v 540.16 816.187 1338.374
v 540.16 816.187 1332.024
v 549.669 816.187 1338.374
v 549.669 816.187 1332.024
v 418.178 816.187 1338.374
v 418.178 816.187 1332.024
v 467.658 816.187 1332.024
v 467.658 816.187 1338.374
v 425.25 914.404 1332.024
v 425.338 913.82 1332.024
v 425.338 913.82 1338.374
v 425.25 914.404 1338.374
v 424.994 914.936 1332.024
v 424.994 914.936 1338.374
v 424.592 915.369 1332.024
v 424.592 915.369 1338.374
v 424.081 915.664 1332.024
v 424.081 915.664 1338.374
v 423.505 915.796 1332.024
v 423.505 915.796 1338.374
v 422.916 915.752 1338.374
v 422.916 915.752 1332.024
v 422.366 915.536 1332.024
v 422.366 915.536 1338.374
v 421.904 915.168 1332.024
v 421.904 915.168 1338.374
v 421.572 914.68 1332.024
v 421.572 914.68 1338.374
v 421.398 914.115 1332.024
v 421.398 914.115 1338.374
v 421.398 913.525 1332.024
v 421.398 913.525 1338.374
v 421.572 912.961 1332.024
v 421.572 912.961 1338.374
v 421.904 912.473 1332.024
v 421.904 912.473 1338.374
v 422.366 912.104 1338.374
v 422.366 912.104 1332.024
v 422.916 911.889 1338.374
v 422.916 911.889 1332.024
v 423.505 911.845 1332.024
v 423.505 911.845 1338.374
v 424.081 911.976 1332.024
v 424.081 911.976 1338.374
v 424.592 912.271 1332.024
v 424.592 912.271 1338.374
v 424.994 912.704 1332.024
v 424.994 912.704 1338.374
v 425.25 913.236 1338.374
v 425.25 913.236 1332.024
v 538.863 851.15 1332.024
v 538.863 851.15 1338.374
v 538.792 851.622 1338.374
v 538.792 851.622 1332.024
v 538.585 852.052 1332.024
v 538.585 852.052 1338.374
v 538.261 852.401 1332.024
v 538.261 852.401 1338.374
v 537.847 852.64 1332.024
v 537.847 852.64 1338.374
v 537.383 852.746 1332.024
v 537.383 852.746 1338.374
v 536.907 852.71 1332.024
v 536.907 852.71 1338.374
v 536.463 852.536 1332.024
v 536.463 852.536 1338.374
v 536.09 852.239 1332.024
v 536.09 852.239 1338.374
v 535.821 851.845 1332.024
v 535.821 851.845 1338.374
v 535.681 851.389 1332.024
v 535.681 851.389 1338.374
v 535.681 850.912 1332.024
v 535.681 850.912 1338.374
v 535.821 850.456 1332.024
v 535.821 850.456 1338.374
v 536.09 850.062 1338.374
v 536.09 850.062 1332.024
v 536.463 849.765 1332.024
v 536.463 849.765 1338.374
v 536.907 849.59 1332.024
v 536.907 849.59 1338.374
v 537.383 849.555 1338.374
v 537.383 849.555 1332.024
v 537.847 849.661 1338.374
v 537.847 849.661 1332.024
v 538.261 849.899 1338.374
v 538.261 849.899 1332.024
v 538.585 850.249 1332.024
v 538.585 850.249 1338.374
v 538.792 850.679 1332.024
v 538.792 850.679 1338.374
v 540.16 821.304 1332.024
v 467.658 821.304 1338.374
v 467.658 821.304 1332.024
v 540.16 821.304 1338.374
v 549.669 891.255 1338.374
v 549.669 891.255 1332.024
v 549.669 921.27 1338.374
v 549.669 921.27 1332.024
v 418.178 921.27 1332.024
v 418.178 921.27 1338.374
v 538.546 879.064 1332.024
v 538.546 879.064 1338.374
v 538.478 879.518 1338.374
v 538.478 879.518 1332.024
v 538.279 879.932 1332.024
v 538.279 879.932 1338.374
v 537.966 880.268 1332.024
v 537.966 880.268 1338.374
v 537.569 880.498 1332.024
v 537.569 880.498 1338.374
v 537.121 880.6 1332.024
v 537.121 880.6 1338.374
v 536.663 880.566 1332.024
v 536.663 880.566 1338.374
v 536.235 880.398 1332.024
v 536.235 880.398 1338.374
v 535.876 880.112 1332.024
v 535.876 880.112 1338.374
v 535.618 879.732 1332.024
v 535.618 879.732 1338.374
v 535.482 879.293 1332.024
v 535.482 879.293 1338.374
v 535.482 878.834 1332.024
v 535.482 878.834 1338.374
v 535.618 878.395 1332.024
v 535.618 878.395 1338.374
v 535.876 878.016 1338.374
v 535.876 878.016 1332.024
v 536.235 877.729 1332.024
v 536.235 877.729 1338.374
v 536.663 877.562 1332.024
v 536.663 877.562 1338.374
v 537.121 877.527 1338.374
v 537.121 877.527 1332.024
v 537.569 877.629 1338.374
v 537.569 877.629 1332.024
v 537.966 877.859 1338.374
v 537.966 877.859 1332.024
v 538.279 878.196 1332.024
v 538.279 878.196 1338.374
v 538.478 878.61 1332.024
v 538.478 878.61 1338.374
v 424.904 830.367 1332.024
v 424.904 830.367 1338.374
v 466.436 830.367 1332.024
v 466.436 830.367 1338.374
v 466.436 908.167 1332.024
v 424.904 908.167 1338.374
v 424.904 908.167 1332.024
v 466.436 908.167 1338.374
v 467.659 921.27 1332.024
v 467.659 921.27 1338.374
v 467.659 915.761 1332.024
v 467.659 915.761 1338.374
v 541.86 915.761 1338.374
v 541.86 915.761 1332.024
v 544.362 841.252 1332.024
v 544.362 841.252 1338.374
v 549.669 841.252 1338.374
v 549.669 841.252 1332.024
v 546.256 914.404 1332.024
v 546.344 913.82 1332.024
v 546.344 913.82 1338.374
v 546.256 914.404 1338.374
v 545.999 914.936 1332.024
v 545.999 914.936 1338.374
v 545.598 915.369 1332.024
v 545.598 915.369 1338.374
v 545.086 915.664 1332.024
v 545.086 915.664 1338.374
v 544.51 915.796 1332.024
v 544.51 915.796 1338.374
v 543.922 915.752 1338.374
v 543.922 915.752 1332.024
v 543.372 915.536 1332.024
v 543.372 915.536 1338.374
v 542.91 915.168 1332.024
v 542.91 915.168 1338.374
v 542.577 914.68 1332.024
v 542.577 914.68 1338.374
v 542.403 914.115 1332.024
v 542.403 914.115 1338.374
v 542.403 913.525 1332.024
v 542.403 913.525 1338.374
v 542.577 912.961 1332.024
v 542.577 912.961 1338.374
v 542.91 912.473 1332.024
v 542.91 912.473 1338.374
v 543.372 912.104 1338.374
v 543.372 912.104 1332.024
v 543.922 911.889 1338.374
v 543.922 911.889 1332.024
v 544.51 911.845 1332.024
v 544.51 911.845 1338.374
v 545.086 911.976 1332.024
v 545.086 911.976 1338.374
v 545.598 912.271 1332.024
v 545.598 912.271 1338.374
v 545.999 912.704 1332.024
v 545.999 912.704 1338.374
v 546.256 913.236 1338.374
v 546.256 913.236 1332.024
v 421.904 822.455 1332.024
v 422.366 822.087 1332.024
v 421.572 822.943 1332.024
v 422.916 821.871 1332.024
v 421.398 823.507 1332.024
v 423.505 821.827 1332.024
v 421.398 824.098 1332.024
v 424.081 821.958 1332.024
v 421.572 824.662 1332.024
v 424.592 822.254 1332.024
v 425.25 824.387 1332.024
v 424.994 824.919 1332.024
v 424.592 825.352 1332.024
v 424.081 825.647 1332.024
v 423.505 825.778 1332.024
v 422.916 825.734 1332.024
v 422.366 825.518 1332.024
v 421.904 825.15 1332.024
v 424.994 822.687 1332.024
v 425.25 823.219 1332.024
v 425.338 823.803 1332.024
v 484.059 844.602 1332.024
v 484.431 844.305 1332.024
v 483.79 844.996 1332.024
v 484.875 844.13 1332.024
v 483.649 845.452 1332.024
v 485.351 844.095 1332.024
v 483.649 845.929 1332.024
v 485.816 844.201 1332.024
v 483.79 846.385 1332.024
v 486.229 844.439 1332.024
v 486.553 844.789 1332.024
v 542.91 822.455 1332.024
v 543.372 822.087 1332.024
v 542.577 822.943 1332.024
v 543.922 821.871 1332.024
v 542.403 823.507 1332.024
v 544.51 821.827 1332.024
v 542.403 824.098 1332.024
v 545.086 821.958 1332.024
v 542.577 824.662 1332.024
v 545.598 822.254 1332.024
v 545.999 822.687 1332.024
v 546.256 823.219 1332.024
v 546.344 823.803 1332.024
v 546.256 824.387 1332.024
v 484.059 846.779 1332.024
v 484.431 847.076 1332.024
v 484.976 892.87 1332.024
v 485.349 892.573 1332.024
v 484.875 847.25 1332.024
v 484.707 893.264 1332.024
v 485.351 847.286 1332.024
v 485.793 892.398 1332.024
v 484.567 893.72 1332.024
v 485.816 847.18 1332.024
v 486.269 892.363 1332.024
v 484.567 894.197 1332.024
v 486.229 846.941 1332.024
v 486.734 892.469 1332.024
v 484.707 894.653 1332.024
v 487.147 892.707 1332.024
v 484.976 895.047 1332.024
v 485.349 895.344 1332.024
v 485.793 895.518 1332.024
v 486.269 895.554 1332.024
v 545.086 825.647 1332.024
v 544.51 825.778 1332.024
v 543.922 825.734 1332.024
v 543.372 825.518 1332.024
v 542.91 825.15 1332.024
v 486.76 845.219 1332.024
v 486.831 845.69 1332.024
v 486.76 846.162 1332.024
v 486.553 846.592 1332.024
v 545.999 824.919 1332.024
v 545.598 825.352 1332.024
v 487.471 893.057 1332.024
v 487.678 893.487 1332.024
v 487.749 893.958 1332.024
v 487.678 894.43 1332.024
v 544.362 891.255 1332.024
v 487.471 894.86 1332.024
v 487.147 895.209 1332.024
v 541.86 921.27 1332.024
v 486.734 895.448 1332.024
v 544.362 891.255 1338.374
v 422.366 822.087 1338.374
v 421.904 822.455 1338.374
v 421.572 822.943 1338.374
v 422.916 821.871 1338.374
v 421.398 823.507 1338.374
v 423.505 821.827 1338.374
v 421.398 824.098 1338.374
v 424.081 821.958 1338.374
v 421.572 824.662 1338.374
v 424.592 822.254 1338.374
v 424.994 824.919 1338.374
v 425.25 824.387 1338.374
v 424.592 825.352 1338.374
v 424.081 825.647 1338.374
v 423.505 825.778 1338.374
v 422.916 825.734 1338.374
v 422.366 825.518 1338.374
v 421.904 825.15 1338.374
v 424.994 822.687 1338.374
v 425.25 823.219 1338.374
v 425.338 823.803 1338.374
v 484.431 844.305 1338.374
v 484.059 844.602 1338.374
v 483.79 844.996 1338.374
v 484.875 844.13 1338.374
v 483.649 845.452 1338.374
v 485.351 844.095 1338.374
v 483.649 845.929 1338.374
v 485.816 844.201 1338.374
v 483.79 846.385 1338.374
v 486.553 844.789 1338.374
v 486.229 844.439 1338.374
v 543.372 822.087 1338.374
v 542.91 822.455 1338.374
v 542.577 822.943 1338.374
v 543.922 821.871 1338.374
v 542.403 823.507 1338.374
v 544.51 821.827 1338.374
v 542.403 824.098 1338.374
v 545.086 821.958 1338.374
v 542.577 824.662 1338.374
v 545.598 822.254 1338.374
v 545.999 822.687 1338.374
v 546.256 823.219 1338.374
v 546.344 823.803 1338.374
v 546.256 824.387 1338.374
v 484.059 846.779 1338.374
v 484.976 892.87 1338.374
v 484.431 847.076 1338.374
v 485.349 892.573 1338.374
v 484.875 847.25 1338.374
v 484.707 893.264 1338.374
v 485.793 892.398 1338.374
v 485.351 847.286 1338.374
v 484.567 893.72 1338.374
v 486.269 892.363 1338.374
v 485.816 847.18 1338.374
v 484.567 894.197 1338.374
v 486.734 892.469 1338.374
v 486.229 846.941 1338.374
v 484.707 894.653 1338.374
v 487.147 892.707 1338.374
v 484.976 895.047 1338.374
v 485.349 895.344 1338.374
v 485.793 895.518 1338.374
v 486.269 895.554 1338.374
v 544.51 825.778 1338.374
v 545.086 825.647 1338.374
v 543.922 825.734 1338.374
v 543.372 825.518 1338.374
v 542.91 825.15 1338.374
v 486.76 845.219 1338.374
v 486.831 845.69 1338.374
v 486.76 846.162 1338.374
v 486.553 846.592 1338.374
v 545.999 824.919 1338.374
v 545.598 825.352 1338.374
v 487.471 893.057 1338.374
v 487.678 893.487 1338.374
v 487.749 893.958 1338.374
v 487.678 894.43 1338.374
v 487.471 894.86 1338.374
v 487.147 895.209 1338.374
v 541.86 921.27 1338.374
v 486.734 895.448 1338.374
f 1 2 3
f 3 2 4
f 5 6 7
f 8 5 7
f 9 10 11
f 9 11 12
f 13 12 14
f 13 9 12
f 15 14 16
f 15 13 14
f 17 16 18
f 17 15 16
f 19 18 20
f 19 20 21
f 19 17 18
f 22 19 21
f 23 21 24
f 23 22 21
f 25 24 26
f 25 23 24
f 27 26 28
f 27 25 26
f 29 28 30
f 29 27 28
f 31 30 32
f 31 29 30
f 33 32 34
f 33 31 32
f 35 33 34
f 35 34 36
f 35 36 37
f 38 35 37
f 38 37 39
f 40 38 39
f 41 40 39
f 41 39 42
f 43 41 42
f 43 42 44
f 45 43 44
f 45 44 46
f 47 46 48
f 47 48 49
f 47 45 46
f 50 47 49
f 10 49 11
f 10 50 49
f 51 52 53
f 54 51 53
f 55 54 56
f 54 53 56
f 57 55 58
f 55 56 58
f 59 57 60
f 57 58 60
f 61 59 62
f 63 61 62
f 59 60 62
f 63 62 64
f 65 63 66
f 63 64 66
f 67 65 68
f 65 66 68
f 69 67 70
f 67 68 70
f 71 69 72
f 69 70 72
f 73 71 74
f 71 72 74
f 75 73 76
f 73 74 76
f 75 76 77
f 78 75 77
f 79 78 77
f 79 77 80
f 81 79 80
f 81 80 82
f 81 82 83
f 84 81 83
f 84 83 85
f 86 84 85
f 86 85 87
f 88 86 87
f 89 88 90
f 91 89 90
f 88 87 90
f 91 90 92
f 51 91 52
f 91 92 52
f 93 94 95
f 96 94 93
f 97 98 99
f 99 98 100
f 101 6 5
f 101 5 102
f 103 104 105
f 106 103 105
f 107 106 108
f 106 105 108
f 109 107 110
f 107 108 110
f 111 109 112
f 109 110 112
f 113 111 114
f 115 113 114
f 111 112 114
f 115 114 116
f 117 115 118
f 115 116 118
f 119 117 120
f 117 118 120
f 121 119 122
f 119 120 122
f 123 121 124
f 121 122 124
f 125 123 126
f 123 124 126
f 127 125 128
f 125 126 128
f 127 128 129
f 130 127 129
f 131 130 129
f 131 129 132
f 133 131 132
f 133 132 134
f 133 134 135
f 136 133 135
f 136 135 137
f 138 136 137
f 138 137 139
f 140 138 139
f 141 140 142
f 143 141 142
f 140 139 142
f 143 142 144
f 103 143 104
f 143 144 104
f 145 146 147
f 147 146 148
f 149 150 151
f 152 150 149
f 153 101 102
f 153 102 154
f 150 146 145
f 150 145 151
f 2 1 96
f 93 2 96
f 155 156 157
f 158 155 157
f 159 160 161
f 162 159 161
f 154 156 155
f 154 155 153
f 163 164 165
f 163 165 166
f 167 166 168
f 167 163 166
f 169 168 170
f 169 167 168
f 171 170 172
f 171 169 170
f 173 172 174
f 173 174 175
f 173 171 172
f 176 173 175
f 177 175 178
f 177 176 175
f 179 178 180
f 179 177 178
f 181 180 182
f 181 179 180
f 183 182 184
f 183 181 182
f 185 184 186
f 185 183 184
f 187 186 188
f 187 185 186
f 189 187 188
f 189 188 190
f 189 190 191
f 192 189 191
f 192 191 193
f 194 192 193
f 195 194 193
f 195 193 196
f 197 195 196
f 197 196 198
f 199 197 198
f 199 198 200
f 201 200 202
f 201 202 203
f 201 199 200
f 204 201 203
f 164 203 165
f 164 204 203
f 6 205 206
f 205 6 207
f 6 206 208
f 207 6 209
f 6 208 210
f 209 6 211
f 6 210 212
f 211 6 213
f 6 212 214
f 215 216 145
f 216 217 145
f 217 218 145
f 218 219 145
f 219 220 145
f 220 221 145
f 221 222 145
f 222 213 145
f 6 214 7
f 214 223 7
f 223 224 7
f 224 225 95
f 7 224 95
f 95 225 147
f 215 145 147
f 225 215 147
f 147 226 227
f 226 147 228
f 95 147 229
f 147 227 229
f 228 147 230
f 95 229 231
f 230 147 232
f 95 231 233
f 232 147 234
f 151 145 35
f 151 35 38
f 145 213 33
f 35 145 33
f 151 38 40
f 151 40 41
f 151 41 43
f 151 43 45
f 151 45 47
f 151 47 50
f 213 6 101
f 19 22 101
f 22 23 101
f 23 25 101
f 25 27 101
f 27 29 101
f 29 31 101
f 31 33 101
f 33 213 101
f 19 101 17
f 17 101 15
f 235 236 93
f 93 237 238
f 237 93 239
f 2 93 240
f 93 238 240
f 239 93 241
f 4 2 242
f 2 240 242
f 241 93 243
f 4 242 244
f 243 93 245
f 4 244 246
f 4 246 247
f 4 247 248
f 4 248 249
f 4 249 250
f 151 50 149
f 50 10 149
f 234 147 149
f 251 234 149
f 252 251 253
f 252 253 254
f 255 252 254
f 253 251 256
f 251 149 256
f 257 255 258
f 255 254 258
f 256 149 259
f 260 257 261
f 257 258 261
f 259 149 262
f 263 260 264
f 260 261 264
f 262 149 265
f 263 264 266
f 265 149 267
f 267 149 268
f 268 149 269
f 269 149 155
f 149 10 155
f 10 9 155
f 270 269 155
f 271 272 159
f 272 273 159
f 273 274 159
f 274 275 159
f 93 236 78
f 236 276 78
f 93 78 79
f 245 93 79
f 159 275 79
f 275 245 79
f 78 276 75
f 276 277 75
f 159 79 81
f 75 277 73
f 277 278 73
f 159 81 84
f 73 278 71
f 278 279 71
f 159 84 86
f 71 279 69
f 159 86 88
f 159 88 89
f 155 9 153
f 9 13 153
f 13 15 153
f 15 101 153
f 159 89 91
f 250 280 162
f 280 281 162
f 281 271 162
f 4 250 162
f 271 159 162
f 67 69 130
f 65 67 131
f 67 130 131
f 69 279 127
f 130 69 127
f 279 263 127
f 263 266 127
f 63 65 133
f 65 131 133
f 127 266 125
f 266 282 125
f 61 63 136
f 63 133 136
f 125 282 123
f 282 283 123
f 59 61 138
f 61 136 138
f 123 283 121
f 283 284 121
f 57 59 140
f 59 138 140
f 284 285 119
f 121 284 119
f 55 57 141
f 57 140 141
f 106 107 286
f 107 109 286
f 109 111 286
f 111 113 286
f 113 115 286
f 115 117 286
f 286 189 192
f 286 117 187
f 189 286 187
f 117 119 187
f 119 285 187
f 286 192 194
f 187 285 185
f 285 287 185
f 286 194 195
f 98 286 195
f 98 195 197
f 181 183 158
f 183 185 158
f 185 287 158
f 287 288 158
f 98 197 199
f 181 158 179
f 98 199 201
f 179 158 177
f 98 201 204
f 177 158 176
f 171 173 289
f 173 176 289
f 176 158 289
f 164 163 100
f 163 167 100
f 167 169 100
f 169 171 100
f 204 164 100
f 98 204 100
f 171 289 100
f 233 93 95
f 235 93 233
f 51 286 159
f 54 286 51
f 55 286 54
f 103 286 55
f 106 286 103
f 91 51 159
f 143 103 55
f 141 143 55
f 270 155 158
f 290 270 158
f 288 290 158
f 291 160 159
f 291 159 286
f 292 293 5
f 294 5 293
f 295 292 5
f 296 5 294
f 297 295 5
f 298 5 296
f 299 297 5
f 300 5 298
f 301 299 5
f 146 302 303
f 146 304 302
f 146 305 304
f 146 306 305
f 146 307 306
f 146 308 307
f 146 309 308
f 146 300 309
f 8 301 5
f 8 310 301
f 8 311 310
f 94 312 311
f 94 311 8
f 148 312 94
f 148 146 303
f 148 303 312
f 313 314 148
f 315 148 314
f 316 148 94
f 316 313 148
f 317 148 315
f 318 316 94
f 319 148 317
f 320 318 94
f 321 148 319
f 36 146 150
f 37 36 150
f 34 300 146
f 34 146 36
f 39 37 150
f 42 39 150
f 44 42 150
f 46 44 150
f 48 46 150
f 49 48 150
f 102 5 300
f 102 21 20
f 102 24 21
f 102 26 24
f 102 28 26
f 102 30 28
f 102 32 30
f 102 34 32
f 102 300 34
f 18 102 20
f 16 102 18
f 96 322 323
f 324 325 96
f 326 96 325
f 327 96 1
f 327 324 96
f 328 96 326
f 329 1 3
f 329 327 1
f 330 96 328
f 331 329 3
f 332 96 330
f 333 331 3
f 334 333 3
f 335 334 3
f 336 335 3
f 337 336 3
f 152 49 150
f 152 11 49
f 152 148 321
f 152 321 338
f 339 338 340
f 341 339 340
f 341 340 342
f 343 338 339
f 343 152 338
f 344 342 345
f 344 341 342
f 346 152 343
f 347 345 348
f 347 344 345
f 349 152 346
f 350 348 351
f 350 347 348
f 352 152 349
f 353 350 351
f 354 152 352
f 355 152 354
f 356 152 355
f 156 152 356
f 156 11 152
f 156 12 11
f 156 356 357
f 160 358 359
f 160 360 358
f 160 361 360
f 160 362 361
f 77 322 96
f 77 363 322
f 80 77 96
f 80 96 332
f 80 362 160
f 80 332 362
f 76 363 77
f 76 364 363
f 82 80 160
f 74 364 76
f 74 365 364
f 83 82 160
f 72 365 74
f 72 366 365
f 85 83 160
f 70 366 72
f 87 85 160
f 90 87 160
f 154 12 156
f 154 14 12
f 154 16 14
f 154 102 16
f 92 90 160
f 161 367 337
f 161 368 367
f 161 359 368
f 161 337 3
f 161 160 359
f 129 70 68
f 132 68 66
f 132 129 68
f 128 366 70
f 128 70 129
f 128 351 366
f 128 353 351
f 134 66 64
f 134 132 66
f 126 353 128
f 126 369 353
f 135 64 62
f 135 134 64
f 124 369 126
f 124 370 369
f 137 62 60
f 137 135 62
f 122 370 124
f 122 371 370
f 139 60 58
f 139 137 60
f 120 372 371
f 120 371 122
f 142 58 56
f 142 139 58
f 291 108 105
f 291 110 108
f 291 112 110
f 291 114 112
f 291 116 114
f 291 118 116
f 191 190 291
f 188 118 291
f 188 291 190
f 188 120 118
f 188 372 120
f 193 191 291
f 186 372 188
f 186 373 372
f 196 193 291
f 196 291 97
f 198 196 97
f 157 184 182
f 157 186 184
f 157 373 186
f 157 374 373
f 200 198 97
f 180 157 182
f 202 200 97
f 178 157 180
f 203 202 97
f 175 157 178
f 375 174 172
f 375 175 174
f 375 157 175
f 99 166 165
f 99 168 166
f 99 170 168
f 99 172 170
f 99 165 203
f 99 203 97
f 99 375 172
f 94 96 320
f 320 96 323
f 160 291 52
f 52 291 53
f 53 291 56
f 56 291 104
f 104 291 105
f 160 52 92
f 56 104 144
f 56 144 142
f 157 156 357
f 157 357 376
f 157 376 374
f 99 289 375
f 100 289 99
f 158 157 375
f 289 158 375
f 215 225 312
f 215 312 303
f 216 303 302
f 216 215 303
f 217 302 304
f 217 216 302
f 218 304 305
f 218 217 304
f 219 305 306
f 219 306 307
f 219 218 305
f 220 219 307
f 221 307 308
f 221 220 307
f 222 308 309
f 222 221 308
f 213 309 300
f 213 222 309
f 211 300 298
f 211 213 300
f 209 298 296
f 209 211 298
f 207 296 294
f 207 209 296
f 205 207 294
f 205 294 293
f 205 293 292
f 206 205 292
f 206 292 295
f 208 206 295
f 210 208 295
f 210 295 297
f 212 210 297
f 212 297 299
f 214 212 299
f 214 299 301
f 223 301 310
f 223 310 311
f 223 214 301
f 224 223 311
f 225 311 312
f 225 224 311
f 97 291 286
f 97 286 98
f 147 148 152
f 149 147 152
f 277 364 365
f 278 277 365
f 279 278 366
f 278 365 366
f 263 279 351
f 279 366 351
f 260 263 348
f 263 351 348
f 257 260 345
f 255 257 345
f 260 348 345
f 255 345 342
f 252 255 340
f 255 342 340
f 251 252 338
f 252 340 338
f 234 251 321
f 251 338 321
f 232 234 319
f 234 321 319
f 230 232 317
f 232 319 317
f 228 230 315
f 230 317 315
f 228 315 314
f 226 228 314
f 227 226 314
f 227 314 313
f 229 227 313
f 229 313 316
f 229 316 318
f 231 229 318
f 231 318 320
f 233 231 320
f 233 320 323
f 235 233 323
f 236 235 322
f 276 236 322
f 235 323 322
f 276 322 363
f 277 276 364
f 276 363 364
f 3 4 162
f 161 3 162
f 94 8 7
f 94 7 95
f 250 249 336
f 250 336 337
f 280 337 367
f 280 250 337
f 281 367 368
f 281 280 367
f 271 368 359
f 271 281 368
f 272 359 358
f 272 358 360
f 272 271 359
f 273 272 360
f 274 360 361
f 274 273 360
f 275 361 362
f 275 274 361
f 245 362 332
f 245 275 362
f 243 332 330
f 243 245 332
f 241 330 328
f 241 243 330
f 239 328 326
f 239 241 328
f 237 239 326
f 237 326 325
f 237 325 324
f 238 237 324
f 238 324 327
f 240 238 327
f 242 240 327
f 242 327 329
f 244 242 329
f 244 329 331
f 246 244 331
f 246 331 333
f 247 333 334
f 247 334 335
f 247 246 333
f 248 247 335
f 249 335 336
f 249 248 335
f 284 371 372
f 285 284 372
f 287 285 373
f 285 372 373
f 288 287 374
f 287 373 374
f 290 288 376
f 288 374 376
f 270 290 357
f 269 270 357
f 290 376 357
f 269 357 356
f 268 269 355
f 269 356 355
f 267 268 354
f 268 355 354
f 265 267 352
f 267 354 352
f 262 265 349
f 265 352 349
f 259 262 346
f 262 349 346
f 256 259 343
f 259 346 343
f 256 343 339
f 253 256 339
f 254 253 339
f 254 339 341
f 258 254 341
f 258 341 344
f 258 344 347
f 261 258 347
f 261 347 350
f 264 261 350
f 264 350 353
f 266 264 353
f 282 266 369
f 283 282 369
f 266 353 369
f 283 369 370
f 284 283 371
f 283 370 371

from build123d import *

# Parameters (mm, degrees)
SKETCH1_W                    = 131.490901353
SKETCH1_H                    = 105.083375897
SKETCH1_R                    = 1.9812
BASE_PLATE_DEPTH             = 6.35
SKETCH2_R                    = 1.6
SKETCH2_R_2                  = 1.540770003
ARDUINO_MOUNTING_HOLES_DEPTH = 6.35
SKETCH3_W                    = 41.532415145
SKETCH3_H                    = 77.800157949
CABLE_OPENING_DEPTH          = 6.35
SKETCH4_W                    = 74.20112143
SKETCH4_H                    = 5.509329328
SKETCH4_W_2                  = 72.501511829
SKETCH4_H_2                  = 5.116757241
SKETCH4_W_3                  = 5.306940646
SKETCH4_H_3                  = 50.003346063
CUT_EXTRUDE3_DEPTH           = 6.35


with BuildPart() as part:
    # Sketch1 → Base_Plate (new body)
    with BuildSketch(Plane.XY.offset(1332.023843603)):
        with Locations((483.923899553, 868.728663849)):
            Rectangle(SKETCH1_W, SKETCH1_H)
        with Locations((423.356809583, 913.820206664)):
            Circle(SKETCH1_R, mode=Mode.SUBTRACT)
        with Locations((544.362409583, 913.820206664)):
            Circle(SKETCH1_R, mode=Mode.SUBTRACT)
        with Locations((544.362409583, 823.802606664)):
            Circle(SKETCH1_R, mode=Mode.SUBTRACT)
        with Locations((423.356809583, 823.802606664)):
            Circle(SKETCH1_R, mode=Mode.SUBTRACT)
    extrude(amount=BASE_PLATE_DEPTH)

    # Sketch2 → Arduino_Mounting_Holes (cut)
    with BuildSketch(Plane.XY.offset(1338.373843603)):
        with Locations((486.149027751, 893.958307234)):
            Circle(SKETCH2_R)
        with Locations((537.005692703, 879.063667595)):
            Circle(SKETCH2_R_2)
        with Locations((537.262931981, 851.150350094)):
            Circle(SKETCH2_R)
        with Locations((485.231408993, 845.690321199)):
            Circle(SKETCH2_R)
    extrude(amount=-ARDUINO_MOUNTING_HOLES_DEPTH, mode=Mode.SUBTRACT)

    # Sketch3 → Cable_Opening (cut)
    with BuildSketch(Plane.XY.offset(1338.373843603)):
        with Locations((445.669830045, 869.267134618)):
            Rectangle(SKETCH3_W, SKETCH3_H)
    extrude(amount=-CABLE_OPENING_DEPTH, mode=Mode.SUBTRACT)

    # Sketch4 → Cut-Extrude3 (cut)
    with BuildSketch(Plane.XY.offset(1338.373843603)):
        with Locations((504.759181332, 918.515687133)):
            Rectangle(SKETCH4_W, SKETCH4_H)
        with Locations((503.90881977, 818.745354521)):
            Rectangle(SKETCH4_W_2, SKETCH4_H_2)
        with Locations((547.015879906, 866.253246095)):
            Rectangle(SKETCH4_W_3, SKETCH4_H_3)
    extrude(amount=-CUT_EXTRUDE3_DEPTH, mode=Mode.SUBTRACT)


solid = part.part
